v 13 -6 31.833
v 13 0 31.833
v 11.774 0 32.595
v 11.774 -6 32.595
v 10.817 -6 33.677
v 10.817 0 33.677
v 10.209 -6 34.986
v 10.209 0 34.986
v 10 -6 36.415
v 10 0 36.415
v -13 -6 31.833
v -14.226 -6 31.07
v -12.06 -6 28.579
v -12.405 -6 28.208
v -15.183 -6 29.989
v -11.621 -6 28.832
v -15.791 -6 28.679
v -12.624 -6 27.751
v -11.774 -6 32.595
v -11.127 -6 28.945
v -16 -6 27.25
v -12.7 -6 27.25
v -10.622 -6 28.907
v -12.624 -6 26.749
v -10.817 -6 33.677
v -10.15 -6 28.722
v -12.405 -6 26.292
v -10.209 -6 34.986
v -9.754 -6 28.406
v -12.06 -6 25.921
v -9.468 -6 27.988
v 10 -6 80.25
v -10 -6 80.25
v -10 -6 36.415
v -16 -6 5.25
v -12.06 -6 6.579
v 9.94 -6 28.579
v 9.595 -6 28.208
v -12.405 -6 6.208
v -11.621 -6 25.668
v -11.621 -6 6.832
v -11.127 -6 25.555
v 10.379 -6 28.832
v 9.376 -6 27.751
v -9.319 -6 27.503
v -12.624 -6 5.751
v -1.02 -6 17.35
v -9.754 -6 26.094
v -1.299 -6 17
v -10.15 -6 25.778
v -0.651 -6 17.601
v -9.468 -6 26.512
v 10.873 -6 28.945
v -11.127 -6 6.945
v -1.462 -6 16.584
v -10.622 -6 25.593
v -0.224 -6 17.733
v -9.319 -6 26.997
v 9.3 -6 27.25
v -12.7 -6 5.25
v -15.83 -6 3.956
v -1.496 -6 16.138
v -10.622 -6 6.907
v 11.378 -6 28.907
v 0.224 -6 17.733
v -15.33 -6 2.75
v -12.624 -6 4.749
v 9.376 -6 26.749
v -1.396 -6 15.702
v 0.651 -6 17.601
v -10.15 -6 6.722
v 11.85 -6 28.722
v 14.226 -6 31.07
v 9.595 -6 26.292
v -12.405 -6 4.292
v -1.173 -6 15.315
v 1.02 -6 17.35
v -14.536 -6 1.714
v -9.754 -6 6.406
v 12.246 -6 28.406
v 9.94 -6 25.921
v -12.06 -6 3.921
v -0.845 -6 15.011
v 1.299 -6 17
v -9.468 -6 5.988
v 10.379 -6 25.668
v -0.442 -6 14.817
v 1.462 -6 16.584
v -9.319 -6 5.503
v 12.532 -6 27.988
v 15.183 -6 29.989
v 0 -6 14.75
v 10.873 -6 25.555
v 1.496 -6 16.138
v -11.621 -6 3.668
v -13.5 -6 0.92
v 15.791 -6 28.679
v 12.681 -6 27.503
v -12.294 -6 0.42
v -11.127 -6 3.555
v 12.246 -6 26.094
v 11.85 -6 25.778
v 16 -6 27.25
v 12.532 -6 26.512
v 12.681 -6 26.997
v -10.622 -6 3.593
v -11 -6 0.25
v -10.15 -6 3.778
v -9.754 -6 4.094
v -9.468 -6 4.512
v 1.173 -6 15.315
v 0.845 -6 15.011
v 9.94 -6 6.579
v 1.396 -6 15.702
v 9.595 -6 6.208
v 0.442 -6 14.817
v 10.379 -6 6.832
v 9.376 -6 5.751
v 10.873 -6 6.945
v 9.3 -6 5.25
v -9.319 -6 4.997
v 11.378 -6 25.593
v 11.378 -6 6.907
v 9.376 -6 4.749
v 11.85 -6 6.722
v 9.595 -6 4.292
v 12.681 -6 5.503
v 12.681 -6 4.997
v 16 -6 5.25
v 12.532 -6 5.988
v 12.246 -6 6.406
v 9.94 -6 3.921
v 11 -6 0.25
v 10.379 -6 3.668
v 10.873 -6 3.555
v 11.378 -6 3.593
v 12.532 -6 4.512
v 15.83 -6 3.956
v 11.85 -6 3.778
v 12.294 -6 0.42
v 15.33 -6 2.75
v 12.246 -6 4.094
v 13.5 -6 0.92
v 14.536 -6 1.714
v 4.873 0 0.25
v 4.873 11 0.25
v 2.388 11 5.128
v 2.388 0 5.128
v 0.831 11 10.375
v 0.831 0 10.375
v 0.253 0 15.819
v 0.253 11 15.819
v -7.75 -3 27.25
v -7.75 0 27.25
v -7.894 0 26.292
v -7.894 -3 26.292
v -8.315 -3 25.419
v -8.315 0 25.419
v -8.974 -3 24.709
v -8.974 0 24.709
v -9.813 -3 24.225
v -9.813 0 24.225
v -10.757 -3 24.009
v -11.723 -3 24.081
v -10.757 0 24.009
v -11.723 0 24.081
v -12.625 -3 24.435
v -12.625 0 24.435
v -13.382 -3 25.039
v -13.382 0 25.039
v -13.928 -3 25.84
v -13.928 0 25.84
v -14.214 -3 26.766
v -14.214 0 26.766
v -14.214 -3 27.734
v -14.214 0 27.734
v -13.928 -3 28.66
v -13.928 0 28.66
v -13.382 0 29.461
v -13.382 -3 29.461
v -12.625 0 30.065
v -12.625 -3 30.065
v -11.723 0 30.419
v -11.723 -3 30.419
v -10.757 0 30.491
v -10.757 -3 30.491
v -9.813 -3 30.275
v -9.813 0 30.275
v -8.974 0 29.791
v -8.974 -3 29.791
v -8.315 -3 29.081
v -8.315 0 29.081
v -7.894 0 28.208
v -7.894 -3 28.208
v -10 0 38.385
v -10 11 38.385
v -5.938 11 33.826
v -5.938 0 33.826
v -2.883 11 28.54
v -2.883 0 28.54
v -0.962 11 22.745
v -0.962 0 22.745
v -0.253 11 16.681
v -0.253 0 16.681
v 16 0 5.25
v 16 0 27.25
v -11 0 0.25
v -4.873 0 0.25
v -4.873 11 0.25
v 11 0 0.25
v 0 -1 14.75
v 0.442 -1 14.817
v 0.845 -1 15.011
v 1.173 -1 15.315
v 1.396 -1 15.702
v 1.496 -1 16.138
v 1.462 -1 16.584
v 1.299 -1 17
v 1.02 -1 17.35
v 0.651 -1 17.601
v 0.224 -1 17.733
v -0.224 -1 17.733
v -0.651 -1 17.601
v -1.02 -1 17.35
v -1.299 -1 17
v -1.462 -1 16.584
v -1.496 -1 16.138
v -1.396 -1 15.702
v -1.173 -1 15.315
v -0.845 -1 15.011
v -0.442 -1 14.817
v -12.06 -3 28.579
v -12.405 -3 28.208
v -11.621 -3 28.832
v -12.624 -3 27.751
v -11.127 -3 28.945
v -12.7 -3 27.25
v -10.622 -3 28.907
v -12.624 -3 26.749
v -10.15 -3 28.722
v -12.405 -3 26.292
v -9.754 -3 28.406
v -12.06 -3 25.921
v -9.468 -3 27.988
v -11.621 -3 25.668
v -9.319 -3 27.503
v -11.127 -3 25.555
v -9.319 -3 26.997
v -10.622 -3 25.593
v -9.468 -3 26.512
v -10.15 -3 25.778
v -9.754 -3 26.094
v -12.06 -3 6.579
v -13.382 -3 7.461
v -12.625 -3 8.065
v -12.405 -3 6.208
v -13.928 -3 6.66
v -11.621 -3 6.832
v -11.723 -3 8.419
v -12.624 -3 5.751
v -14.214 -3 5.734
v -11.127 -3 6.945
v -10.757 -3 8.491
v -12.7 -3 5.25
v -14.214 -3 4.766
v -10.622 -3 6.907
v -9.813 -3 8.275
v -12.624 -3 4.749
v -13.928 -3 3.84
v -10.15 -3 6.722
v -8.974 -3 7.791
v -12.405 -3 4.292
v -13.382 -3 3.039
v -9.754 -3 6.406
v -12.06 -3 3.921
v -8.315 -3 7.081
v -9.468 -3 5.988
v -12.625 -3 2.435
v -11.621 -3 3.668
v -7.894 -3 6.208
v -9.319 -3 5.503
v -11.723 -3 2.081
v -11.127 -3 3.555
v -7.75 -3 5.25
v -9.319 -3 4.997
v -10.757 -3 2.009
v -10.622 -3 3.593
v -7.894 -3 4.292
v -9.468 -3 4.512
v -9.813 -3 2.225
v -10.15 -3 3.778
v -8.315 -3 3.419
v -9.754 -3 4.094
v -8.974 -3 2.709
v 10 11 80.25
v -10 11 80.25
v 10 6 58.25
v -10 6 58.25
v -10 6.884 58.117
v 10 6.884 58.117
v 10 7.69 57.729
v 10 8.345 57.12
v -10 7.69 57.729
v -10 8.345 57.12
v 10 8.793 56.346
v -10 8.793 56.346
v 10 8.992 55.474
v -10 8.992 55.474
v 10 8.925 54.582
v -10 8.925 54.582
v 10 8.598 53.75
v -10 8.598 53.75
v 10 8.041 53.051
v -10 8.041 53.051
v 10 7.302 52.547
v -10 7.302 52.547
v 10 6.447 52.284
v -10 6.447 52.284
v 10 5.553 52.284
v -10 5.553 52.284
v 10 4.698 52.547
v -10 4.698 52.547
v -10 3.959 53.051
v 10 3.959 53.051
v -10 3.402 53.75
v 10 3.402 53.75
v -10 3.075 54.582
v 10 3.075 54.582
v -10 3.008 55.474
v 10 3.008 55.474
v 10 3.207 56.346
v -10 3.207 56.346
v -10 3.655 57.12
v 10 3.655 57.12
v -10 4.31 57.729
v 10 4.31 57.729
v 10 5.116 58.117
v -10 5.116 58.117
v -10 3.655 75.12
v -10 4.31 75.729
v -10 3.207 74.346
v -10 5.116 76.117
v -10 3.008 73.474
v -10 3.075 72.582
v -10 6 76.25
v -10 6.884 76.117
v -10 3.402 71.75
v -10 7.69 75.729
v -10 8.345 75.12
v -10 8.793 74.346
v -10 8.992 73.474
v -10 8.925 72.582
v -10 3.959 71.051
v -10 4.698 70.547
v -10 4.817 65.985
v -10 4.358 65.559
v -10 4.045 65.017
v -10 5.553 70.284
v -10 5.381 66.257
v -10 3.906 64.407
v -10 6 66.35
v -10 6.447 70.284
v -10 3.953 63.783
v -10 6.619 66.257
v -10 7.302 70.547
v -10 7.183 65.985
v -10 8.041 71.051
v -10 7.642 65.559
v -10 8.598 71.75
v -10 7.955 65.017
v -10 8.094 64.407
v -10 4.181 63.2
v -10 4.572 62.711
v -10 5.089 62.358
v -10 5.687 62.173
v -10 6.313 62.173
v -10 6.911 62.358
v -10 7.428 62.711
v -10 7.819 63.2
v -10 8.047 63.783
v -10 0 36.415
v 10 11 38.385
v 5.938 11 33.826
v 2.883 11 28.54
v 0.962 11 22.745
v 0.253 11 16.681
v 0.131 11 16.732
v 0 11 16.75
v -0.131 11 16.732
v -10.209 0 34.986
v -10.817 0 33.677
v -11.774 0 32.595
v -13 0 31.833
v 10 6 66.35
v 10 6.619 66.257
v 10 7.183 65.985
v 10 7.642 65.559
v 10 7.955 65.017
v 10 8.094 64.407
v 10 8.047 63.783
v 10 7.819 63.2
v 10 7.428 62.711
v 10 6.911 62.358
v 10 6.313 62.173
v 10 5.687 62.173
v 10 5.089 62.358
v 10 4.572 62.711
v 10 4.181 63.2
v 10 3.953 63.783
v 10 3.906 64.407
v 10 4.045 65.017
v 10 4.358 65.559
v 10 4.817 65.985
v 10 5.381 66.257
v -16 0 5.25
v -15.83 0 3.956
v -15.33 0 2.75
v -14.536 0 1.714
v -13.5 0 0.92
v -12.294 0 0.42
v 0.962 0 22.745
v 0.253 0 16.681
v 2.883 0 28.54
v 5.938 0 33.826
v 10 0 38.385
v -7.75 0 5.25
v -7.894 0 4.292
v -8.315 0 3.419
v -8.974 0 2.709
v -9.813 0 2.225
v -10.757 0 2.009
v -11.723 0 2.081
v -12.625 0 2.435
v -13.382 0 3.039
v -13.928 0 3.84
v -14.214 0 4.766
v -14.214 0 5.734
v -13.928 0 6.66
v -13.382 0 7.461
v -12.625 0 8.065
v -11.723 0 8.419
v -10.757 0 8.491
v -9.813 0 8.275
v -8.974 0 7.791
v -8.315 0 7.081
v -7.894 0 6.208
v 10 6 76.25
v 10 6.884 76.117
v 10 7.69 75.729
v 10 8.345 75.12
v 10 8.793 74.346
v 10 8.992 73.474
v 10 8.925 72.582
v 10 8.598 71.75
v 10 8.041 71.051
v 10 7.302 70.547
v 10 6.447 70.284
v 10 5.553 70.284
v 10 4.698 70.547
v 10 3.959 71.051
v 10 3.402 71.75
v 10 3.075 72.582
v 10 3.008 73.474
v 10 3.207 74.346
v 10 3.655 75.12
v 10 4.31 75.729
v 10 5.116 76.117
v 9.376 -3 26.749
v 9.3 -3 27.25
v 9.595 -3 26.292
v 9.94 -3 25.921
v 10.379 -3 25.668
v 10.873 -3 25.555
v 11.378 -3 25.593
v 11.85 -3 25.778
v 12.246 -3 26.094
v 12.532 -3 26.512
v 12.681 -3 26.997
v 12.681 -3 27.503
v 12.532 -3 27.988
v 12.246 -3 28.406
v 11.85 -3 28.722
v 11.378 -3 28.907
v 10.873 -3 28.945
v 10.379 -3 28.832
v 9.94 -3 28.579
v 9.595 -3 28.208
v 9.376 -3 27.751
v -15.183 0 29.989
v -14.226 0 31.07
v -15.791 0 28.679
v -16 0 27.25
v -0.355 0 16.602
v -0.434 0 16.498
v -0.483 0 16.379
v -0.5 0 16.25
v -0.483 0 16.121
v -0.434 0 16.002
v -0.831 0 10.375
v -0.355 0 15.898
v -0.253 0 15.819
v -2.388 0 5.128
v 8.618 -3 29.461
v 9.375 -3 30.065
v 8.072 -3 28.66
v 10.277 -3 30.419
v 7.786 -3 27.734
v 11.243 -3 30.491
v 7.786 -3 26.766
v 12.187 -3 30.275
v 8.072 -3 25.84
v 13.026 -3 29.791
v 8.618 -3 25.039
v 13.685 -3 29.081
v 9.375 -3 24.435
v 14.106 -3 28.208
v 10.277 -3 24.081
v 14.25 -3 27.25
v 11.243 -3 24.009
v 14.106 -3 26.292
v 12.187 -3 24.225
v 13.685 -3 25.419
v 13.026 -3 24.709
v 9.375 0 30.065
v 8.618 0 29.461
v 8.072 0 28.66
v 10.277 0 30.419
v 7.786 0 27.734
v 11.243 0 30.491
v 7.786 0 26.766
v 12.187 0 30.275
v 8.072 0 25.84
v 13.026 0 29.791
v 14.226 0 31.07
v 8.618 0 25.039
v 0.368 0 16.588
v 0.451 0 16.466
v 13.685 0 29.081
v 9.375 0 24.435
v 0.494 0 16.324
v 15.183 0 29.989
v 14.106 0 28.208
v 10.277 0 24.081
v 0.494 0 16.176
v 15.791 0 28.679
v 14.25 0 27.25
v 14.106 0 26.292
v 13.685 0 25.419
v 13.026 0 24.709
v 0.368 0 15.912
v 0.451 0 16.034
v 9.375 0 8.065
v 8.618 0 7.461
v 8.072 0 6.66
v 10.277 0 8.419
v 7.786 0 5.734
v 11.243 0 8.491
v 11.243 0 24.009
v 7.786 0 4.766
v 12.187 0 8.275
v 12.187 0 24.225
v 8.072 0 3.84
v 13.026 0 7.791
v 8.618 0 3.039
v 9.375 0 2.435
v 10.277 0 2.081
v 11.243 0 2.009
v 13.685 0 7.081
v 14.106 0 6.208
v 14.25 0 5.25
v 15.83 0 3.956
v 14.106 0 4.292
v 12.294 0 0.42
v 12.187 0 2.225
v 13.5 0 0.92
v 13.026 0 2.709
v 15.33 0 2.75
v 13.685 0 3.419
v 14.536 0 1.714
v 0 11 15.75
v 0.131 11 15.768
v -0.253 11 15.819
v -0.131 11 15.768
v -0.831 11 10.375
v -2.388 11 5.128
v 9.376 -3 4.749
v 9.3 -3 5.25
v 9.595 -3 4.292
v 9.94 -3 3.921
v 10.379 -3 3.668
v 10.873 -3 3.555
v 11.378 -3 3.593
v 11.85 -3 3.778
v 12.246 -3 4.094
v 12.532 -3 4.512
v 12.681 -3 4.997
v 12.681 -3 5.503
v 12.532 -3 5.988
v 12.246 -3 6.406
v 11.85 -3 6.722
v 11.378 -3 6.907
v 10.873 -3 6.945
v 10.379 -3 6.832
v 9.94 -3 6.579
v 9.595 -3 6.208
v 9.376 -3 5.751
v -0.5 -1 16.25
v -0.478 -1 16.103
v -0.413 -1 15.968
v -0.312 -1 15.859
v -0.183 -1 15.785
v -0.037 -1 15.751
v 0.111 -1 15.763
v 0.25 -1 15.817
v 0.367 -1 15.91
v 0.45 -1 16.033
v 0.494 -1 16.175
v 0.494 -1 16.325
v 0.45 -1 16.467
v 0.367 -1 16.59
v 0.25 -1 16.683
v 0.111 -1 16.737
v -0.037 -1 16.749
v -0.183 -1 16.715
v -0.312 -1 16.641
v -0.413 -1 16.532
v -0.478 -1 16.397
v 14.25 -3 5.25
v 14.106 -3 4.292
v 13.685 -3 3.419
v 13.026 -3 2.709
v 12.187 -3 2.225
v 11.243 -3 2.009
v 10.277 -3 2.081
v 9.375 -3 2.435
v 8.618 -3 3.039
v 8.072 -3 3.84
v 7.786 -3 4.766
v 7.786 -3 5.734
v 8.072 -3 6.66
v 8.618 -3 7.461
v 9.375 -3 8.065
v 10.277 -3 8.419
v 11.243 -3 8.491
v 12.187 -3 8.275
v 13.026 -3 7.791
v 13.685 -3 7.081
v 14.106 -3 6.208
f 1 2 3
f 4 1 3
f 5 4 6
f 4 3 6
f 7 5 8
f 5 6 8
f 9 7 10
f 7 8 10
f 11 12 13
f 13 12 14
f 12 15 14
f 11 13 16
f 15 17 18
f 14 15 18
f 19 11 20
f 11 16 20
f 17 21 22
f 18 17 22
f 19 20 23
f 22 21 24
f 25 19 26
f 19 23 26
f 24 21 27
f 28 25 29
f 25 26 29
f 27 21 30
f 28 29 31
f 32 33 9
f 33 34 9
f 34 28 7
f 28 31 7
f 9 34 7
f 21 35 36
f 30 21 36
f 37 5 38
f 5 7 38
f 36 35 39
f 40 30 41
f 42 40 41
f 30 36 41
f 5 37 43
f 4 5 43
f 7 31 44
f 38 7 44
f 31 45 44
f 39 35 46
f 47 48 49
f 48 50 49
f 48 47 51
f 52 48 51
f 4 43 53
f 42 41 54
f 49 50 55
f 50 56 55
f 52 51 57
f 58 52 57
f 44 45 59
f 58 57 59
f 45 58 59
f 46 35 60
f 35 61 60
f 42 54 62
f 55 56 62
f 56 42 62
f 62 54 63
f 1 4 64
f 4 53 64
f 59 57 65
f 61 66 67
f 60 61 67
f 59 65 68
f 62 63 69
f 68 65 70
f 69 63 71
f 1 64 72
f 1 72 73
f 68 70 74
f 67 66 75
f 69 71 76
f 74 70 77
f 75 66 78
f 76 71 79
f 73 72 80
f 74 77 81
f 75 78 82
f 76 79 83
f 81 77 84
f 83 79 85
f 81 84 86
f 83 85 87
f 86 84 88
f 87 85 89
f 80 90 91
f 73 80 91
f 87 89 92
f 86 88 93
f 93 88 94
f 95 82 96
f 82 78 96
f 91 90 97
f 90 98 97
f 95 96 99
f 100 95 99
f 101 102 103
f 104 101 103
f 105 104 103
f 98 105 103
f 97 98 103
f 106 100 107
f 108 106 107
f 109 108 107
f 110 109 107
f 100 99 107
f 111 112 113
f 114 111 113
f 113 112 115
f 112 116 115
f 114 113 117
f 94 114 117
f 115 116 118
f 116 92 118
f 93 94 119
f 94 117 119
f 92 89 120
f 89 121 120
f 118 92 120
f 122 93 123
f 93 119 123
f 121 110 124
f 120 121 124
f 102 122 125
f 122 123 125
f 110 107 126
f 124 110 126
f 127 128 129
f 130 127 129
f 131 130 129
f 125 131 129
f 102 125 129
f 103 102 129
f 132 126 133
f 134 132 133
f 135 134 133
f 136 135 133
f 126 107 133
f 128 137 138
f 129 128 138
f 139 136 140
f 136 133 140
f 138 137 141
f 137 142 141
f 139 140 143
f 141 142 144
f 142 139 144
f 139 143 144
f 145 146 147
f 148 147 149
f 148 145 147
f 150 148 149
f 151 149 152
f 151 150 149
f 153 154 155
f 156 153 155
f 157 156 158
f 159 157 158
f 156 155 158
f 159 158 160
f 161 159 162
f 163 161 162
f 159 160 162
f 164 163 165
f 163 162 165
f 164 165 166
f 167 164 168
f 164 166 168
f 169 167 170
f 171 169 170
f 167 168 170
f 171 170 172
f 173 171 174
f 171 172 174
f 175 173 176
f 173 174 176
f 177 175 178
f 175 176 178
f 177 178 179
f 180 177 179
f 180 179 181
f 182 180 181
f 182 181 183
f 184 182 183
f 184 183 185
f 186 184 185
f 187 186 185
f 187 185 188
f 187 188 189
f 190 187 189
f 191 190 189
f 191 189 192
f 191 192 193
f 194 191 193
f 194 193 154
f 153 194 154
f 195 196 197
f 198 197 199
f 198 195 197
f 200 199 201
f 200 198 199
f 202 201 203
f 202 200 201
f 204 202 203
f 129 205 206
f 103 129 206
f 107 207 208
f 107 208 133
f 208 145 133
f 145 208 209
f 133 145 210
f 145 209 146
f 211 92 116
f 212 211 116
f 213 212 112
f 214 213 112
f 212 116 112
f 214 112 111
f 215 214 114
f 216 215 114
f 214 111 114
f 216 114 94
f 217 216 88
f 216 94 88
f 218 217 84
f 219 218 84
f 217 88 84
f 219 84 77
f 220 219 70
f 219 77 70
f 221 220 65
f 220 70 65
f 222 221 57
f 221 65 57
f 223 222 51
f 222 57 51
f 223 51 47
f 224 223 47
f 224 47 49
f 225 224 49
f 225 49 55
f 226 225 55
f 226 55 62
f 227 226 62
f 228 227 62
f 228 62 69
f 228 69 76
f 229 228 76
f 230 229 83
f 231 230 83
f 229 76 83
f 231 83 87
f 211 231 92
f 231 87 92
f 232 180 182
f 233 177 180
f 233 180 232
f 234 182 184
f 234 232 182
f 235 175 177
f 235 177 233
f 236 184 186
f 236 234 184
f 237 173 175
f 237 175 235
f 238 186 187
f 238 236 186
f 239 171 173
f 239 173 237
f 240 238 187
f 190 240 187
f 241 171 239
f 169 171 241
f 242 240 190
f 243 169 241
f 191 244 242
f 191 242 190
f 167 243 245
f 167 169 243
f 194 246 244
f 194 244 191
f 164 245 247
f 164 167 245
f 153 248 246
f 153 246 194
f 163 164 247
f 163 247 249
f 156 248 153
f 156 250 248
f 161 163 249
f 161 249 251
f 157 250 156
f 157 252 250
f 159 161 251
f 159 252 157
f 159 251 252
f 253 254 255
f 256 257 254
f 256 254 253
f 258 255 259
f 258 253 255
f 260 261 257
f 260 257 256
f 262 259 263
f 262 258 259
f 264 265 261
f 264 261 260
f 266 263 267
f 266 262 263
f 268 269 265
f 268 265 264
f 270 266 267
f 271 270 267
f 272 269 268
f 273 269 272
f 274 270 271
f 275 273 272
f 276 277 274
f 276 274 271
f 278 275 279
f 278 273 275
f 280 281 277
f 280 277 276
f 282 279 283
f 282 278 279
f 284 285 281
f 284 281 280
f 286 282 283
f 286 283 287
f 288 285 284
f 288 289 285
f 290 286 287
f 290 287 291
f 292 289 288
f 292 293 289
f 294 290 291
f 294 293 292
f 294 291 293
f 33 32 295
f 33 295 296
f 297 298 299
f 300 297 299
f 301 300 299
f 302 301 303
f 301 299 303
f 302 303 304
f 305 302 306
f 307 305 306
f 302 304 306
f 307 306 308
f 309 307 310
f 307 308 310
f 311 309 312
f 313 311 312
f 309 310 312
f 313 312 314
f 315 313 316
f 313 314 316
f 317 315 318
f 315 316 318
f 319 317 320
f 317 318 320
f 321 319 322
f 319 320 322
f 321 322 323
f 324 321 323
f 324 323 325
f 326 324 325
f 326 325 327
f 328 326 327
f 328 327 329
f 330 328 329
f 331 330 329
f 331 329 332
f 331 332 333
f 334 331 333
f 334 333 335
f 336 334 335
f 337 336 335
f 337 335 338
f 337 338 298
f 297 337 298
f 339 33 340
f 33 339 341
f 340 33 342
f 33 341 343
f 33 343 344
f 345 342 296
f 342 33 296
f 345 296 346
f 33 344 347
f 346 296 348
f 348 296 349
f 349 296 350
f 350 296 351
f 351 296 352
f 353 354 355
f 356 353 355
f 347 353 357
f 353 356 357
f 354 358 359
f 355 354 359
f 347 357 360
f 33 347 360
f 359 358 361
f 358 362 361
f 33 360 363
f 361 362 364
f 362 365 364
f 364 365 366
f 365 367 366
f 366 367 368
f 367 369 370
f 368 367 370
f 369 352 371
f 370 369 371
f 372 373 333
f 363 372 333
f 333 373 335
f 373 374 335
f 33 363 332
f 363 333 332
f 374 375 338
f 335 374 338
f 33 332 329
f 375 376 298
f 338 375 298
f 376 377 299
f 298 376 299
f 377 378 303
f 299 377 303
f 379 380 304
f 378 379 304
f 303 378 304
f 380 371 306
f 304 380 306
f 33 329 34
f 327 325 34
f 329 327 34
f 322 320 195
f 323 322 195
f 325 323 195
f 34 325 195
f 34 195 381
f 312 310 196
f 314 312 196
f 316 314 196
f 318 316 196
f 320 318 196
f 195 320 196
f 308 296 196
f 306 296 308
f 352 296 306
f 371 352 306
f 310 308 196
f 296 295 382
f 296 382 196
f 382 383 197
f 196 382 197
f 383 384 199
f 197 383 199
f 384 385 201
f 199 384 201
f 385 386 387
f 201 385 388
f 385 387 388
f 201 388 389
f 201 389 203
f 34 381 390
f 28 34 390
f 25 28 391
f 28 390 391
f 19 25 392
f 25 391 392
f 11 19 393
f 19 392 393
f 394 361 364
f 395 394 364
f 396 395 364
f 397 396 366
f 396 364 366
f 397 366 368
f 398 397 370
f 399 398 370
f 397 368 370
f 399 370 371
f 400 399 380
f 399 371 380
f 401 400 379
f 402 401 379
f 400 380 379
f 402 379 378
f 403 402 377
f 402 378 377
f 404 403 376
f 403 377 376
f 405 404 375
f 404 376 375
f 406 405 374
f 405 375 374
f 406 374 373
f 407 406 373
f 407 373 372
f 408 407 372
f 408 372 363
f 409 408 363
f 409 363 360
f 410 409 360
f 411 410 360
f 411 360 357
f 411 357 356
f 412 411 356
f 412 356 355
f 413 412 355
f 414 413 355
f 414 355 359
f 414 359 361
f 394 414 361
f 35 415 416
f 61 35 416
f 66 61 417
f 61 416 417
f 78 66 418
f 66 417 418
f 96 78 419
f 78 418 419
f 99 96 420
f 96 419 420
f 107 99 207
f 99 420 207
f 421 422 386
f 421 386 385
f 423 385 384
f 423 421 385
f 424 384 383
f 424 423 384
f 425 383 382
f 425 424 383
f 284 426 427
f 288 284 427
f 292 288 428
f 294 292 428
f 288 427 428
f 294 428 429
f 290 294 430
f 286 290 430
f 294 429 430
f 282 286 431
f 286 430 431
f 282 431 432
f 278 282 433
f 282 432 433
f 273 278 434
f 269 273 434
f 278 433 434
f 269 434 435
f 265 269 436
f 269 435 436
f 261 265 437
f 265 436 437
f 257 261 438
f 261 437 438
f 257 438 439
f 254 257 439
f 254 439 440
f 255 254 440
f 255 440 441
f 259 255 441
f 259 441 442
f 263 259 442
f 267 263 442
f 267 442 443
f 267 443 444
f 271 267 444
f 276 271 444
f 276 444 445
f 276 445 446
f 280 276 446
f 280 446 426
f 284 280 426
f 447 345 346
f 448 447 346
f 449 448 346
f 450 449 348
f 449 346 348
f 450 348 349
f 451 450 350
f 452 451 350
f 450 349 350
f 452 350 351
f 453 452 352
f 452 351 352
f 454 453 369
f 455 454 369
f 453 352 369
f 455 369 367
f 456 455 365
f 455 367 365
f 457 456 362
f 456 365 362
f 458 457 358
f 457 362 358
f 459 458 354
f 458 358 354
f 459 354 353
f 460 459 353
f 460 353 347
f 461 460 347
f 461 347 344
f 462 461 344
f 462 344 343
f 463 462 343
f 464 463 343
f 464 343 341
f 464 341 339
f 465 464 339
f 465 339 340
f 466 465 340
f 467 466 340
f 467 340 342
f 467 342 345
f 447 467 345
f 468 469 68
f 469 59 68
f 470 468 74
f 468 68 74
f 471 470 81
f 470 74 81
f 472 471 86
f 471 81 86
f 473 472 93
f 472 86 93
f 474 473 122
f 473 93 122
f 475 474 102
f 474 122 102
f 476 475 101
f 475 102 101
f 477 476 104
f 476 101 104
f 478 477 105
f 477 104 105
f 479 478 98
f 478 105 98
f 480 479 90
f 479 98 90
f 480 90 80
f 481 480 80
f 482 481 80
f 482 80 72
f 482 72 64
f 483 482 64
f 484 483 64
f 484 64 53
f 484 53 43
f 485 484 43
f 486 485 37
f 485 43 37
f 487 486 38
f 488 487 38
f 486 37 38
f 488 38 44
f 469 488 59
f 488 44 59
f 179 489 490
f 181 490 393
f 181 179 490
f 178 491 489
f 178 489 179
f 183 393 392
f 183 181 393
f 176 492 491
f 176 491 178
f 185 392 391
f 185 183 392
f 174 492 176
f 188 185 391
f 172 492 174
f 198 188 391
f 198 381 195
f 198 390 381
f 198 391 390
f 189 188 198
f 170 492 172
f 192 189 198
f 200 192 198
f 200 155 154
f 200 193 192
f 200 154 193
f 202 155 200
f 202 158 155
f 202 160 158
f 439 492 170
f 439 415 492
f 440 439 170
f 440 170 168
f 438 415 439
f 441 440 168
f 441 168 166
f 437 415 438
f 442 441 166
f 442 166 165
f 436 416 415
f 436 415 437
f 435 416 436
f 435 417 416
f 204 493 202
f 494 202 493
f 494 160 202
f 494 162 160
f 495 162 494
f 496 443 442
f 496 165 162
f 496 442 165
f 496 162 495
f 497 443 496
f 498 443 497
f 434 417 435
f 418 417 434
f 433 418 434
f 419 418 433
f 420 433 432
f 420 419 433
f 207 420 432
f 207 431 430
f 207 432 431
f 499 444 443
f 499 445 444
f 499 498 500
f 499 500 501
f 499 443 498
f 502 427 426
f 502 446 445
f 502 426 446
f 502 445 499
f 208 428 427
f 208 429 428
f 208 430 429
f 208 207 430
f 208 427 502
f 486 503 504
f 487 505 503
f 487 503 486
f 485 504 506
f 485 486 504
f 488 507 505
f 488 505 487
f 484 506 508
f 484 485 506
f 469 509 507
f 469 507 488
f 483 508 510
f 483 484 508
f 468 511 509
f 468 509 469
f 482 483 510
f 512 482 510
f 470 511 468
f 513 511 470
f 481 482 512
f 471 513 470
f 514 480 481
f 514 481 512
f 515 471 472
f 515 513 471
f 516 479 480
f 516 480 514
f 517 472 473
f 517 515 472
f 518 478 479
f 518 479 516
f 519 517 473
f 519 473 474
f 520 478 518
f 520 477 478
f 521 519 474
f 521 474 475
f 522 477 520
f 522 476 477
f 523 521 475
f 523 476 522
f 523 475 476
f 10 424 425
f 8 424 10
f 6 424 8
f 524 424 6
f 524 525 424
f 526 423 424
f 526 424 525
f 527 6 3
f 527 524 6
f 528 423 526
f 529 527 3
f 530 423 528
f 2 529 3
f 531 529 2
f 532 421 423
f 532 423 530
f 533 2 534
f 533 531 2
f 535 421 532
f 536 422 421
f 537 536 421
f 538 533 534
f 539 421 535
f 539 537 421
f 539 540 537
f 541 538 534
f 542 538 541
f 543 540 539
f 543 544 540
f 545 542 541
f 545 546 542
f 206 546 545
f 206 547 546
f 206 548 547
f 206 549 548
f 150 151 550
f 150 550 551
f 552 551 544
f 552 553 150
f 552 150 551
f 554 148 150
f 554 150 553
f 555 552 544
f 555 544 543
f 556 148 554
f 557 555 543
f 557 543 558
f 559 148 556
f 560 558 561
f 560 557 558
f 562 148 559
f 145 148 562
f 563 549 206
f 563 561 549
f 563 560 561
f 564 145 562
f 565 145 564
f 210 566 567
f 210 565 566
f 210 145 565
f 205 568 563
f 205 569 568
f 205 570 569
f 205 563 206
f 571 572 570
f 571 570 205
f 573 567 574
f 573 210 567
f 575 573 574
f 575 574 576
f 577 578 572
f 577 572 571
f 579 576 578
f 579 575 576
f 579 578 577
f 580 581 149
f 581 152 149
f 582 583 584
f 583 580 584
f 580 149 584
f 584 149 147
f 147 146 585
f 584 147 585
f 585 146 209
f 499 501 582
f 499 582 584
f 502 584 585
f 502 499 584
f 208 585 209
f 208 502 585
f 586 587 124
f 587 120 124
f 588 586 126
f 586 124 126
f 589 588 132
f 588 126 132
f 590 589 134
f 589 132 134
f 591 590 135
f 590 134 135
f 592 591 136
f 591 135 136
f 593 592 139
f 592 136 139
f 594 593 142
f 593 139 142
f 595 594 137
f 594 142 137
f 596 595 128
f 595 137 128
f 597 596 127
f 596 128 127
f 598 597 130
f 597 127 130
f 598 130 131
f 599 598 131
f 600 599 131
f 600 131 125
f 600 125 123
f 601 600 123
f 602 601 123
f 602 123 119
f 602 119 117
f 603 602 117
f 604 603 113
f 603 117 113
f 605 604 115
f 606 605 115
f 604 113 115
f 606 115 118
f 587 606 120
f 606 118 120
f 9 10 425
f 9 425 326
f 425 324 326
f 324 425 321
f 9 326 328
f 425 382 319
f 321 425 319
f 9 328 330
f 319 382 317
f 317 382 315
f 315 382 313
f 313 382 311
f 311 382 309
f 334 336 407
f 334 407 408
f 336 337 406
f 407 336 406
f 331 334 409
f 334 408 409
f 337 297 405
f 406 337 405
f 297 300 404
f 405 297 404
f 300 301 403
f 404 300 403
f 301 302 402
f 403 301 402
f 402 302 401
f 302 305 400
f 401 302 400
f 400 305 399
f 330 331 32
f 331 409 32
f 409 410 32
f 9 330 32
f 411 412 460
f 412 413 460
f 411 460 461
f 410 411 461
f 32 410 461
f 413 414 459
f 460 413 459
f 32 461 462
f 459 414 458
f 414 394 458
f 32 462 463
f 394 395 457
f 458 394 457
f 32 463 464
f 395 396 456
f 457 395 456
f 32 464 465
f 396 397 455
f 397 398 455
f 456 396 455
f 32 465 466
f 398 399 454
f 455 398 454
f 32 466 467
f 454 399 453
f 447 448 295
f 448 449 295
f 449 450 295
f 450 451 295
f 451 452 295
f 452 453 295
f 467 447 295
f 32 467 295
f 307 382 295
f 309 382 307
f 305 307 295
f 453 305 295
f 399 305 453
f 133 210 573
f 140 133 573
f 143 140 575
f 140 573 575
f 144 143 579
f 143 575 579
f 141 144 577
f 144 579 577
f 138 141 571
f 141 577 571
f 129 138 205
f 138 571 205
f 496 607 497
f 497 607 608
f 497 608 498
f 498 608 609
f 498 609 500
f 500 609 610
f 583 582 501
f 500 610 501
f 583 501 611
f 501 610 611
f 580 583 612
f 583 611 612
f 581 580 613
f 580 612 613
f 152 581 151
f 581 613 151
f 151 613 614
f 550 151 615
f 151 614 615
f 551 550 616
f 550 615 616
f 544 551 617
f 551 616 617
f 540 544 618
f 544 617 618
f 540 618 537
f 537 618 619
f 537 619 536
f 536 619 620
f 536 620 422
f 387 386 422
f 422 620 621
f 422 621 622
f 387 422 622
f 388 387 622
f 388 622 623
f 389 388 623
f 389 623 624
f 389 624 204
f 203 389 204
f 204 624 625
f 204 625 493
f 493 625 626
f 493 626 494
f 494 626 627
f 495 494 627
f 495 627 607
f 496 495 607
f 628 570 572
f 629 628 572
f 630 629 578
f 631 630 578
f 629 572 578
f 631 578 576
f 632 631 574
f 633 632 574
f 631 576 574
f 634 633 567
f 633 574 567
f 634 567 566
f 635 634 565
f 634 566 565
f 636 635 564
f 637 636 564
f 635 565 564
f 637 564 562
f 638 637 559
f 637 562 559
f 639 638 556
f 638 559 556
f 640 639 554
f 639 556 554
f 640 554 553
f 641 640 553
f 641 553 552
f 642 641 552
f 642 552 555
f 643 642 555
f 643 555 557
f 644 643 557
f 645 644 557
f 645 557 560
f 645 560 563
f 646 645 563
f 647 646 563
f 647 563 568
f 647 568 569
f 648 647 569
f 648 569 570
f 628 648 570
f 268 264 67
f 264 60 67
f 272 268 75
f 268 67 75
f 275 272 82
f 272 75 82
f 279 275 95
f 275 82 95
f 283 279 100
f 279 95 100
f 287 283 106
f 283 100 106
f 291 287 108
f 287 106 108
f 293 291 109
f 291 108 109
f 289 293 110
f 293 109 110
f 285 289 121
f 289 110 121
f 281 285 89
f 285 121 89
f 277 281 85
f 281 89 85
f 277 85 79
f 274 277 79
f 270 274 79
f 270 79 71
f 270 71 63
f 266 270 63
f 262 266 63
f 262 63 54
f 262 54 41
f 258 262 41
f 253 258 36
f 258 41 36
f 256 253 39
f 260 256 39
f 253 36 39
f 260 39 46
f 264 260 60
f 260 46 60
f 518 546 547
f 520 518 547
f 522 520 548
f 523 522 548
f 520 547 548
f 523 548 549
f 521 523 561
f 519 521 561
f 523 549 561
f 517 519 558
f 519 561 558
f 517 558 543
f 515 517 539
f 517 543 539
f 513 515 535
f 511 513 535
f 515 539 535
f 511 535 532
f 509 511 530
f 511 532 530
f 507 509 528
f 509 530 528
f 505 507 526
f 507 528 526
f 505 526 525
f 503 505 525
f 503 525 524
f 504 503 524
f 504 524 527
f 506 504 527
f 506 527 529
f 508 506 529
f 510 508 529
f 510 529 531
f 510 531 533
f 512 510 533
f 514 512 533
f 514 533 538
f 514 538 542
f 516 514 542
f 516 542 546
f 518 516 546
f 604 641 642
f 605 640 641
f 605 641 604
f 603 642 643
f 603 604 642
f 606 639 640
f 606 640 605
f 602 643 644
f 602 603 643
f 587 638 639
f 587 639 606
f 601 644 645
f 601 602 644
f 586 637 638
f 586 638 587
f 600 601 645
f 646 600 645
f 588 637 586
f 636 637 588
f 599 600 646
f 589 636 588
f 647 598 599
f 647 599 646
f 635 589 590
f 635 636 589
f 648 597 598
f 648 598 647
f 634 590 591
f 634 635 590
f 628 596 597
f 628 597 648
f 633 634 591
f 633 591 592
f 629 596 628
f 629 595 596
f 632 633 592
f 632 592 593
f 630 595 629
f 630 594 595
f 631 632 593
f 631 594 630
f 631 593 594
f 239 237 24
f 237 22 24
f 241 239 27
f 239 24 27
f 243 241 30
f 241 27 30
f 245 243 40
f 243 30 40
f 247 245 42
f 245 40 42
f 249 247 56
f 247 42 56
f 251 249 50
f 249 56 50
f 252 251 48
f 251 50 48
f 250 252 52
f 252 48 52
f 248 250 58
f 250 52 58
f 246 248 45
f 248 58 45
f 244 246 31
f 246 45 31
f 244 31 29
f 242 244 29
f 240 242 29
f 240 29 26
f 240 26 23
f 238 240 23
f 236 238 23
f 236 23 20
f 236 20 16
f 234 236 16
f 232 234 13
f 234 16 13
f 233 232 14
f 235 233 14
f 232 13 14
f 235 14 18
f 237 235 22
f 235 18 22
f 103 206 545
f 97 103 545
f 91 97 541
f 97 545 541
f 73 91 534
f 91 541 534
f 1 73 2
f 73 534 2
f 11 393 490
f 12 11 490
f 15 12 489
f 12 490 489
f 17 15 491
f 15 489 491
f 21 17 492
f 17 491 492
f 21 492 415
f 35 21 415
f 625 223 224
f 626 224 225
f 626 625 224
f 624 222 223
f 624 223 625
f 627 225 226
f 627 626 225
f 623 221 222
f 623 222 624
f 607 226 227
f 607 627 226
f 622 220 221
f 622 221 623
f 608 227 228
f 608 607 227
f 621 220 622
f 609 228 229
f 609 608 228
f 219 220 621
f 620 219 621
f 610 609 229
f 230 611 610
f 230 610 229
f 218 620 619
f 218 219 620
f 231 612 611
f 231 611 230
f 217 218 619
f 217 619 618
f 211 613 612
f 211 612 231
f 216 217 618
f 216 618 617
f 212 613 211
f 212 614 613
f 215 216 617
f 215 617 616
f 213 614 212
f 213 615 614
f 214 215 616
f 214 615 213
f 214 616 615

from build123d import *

# Parameters (mm, degrees)
SKETCH1_W                      = 32.5
SKETCH1_H                      = 80.25
BOSS_EXTRUDE1_DEPTH            = 6
BOSS_EXTRUDE2_DEPTH            = 11
F_6_0MM_DOWEL_HOLE1_D          = 6
M5X0_8_TAPPED_HOLE1_D          = 4.2
CBORE_FOR_M3_SHCS1_D           = 3.4
CBORE_FOR_M3_SHCS1_CBORE_D     = 6.5
CBORE_FOR_M3_SHCS1_CBORE_DEPTH = 3
F_1_0_1_DIAMETER_HOLE1_D       = 1
SKETCH12_R                     = 1.5
CUT_EXTRUDE1_DEPTH             = 5
SKETCH13_W                     = 6
SKETCH13_H                     = 35
CUT_EXTRUDE2_DEPTH             = 84.624906577
FILLET1_R                      = 2.38125
SKETCH14_W                     = 34.5
SKETCH14_H                     = 82.25
CUT_EXTRUDE3_DEPTH             = 84.624906577


with BuildPart() as part:
    # Sketch1 → Boss-Extrude1 (new body)
    with BuildSketch(Plane(origin=(0, 0, 0), x_dir=(1, 0, 0), z_dir=(0, 1, 0))):
        with Locations((0, -40.125)):
            Rectangle(SKETCH1_W, SKETCH1_H)
    extrude(amount=-BOSS_EXTRUDE1_DEPTH)

    # Sketch2 → Boss-Extrude2 (add)
    with BuildSketch(Plane(origin=(0, 0, 0), x_dir=(1, 0, 0), z_dir=(0, 1, 0))):
        with BuildLine():
            Line((-5.032198748, 0), (5.032198748, 0))
            ThreePointArc((5.032198748, 0), (1.230950737, -23.858861929), (16.25, -42.782998323))
            Line((16.25, -42.782998323), (16.25, -80.25))
            Line((16.25, -80.25), (-16.25, -80.25))
            Line((-16.25, -80.25), (-16.25, -42.782998323))
            ThreePointArc((-16.25, -42.782998323), (-1.230950737, -23.858861929), (-5.032198748, 0))
        make_face()
    extrude(amount=BOSS_EXTRUDE2_DEPTH)

    # Ø6.0mm Dowel Hole1 (through all)
    with Locations(Plane(origin=(16.25, 0, 0), x_dir=(0, 0, -1), z_dir=(1, 0, 0))):
        with Locations((-73.25, 6), (-55.25, 6)):
            Hole(F_6_0MM_DOWEL_HOLE1_D / 2)

    # M5x0.8 Tapped Hole1 (through all)
    with Locations(Plane(origin=(16.25, 0, 0), x_dir=(0, 0, -1), z_dir=(1, 0, 0))):
        with Locations((-64.25, 6)):
            Hole(M5X0_8_TAPPED_HOLE1_D / 2)

    # CBORE for M3 SHCS1 (through all)
    with Locations(Plane(origin=(0, 0, 0), x_dir=(1, 0, 0), z_dir=(0, 1, 0))):
        with Locations((-11, -5.25), (11, -5.25), (11, -27.25), (-11, -27.25)):
            CounterBoreHole(CBORE_FOR_M3_SHCS1_D / 2, CBORE_FOR_M3_SHCS1_CBORE_D / 2, CBORE_FOR_M3_SHCS1_CBORE_DEPTH)

    # Ø1.0 (1) Diameter Hole1 (through all)
    with Locations(Plane(origin=(0, 11, 0), x_dir=(1, 0, 0), z_dir=(0, 1, 0))):
        with Locations((0, -16.25)):
            Hole(F_1_0_1_DIAMETER_HOLE1_D / 2)

    # Sketch12 → Cut-Extrude1 (cut)
    with BuildSketch(Plane.XZ.offset(6)):
        with Locations(Location((0, 16.25, 0), (0, 0, 270))):
            Circle(SKETCH12_R)
    extrude(amount=-CUT_EXTRUDE1_DEPTH, mode=Mode.SUBTRACT)

    # Sketch13 → Cut-Extrude2 (cut, through all)
    with BuildSketch(Plane(origin=(0, 11, 0), x_dir=(1, 0, 0), z_dir=(0, 1, 0))):
        with Locations((-13.25, -62.75)):
            Rectangle(SKETCH13_W, SKETCH13_H)
        with Locations((13.25, -62.75)):
            Rectangle(SKETCH13_W, SKETCH13_H)
    extrude(amount=-CUT_EXTRUDE2_DEPTH, mode=Mode.SUBTRACT)

    # Fillet1
    fillet1_edges = [part.edges().sort_by_distance(p)[0] for p in [
        (-10.25, 2.5, 45.25),
        (10.25, 2.5, 45.25),
    ]]
    fillet(fillet1_edges, radius=FILLET1_R)

    # Sketch14 → Cut-Extrude3 (cut, through all)
    with BuildSketch(Plane(origin=(0, 11, 0), x_dir=(1, 0, 0), z_dir=(0, 1, 0))):
        with Locations((0, -40.125)):
            Rectangle(SKETCH14_W, SKETCH14_H)
        with BuildLine():
            Line((-10, -80.25), (-10, -36.41515139))
            ThreePointArc((-10, -36.41515139), (-10.816699867, -33.676538602), (-13, -31.832575695))
            ThreePointArc((-13, -31.832575695), (-15.183300133, -29.988612788), (-16, -27.25))
            Line((-16, -27.25), (-16, -5.25))
            ThreePointArc((-16, -5.25), (-14.535533906, -1.714466094), (-11, -0.25))
            Line((-11, -0.25), (11, -0.25))
            ThreePointArc((11, -0.25), (14.535533906, -1.714466094), (16, -5.25))
            Line((16, -5.25), (16, -27.25))
            ThreePointArc((16, -27.25), (15.183300133, -29.988612788), (13, -31.832575695))
            ThreePointArc((13, -31.832575695), (10.816699867, -33.676538602), (10, -36.41515139))
            Line((10, -36.41515139), (10, -80.25))
            Line((10, -80.25), (-10, -80.25))
        make_face(mode=Mode.SUBTRACT)
    extrude(amount=-CUT_EXTRUDE3_DEPTH, mode=Mode.SUBTRACT)


solid = part.part
